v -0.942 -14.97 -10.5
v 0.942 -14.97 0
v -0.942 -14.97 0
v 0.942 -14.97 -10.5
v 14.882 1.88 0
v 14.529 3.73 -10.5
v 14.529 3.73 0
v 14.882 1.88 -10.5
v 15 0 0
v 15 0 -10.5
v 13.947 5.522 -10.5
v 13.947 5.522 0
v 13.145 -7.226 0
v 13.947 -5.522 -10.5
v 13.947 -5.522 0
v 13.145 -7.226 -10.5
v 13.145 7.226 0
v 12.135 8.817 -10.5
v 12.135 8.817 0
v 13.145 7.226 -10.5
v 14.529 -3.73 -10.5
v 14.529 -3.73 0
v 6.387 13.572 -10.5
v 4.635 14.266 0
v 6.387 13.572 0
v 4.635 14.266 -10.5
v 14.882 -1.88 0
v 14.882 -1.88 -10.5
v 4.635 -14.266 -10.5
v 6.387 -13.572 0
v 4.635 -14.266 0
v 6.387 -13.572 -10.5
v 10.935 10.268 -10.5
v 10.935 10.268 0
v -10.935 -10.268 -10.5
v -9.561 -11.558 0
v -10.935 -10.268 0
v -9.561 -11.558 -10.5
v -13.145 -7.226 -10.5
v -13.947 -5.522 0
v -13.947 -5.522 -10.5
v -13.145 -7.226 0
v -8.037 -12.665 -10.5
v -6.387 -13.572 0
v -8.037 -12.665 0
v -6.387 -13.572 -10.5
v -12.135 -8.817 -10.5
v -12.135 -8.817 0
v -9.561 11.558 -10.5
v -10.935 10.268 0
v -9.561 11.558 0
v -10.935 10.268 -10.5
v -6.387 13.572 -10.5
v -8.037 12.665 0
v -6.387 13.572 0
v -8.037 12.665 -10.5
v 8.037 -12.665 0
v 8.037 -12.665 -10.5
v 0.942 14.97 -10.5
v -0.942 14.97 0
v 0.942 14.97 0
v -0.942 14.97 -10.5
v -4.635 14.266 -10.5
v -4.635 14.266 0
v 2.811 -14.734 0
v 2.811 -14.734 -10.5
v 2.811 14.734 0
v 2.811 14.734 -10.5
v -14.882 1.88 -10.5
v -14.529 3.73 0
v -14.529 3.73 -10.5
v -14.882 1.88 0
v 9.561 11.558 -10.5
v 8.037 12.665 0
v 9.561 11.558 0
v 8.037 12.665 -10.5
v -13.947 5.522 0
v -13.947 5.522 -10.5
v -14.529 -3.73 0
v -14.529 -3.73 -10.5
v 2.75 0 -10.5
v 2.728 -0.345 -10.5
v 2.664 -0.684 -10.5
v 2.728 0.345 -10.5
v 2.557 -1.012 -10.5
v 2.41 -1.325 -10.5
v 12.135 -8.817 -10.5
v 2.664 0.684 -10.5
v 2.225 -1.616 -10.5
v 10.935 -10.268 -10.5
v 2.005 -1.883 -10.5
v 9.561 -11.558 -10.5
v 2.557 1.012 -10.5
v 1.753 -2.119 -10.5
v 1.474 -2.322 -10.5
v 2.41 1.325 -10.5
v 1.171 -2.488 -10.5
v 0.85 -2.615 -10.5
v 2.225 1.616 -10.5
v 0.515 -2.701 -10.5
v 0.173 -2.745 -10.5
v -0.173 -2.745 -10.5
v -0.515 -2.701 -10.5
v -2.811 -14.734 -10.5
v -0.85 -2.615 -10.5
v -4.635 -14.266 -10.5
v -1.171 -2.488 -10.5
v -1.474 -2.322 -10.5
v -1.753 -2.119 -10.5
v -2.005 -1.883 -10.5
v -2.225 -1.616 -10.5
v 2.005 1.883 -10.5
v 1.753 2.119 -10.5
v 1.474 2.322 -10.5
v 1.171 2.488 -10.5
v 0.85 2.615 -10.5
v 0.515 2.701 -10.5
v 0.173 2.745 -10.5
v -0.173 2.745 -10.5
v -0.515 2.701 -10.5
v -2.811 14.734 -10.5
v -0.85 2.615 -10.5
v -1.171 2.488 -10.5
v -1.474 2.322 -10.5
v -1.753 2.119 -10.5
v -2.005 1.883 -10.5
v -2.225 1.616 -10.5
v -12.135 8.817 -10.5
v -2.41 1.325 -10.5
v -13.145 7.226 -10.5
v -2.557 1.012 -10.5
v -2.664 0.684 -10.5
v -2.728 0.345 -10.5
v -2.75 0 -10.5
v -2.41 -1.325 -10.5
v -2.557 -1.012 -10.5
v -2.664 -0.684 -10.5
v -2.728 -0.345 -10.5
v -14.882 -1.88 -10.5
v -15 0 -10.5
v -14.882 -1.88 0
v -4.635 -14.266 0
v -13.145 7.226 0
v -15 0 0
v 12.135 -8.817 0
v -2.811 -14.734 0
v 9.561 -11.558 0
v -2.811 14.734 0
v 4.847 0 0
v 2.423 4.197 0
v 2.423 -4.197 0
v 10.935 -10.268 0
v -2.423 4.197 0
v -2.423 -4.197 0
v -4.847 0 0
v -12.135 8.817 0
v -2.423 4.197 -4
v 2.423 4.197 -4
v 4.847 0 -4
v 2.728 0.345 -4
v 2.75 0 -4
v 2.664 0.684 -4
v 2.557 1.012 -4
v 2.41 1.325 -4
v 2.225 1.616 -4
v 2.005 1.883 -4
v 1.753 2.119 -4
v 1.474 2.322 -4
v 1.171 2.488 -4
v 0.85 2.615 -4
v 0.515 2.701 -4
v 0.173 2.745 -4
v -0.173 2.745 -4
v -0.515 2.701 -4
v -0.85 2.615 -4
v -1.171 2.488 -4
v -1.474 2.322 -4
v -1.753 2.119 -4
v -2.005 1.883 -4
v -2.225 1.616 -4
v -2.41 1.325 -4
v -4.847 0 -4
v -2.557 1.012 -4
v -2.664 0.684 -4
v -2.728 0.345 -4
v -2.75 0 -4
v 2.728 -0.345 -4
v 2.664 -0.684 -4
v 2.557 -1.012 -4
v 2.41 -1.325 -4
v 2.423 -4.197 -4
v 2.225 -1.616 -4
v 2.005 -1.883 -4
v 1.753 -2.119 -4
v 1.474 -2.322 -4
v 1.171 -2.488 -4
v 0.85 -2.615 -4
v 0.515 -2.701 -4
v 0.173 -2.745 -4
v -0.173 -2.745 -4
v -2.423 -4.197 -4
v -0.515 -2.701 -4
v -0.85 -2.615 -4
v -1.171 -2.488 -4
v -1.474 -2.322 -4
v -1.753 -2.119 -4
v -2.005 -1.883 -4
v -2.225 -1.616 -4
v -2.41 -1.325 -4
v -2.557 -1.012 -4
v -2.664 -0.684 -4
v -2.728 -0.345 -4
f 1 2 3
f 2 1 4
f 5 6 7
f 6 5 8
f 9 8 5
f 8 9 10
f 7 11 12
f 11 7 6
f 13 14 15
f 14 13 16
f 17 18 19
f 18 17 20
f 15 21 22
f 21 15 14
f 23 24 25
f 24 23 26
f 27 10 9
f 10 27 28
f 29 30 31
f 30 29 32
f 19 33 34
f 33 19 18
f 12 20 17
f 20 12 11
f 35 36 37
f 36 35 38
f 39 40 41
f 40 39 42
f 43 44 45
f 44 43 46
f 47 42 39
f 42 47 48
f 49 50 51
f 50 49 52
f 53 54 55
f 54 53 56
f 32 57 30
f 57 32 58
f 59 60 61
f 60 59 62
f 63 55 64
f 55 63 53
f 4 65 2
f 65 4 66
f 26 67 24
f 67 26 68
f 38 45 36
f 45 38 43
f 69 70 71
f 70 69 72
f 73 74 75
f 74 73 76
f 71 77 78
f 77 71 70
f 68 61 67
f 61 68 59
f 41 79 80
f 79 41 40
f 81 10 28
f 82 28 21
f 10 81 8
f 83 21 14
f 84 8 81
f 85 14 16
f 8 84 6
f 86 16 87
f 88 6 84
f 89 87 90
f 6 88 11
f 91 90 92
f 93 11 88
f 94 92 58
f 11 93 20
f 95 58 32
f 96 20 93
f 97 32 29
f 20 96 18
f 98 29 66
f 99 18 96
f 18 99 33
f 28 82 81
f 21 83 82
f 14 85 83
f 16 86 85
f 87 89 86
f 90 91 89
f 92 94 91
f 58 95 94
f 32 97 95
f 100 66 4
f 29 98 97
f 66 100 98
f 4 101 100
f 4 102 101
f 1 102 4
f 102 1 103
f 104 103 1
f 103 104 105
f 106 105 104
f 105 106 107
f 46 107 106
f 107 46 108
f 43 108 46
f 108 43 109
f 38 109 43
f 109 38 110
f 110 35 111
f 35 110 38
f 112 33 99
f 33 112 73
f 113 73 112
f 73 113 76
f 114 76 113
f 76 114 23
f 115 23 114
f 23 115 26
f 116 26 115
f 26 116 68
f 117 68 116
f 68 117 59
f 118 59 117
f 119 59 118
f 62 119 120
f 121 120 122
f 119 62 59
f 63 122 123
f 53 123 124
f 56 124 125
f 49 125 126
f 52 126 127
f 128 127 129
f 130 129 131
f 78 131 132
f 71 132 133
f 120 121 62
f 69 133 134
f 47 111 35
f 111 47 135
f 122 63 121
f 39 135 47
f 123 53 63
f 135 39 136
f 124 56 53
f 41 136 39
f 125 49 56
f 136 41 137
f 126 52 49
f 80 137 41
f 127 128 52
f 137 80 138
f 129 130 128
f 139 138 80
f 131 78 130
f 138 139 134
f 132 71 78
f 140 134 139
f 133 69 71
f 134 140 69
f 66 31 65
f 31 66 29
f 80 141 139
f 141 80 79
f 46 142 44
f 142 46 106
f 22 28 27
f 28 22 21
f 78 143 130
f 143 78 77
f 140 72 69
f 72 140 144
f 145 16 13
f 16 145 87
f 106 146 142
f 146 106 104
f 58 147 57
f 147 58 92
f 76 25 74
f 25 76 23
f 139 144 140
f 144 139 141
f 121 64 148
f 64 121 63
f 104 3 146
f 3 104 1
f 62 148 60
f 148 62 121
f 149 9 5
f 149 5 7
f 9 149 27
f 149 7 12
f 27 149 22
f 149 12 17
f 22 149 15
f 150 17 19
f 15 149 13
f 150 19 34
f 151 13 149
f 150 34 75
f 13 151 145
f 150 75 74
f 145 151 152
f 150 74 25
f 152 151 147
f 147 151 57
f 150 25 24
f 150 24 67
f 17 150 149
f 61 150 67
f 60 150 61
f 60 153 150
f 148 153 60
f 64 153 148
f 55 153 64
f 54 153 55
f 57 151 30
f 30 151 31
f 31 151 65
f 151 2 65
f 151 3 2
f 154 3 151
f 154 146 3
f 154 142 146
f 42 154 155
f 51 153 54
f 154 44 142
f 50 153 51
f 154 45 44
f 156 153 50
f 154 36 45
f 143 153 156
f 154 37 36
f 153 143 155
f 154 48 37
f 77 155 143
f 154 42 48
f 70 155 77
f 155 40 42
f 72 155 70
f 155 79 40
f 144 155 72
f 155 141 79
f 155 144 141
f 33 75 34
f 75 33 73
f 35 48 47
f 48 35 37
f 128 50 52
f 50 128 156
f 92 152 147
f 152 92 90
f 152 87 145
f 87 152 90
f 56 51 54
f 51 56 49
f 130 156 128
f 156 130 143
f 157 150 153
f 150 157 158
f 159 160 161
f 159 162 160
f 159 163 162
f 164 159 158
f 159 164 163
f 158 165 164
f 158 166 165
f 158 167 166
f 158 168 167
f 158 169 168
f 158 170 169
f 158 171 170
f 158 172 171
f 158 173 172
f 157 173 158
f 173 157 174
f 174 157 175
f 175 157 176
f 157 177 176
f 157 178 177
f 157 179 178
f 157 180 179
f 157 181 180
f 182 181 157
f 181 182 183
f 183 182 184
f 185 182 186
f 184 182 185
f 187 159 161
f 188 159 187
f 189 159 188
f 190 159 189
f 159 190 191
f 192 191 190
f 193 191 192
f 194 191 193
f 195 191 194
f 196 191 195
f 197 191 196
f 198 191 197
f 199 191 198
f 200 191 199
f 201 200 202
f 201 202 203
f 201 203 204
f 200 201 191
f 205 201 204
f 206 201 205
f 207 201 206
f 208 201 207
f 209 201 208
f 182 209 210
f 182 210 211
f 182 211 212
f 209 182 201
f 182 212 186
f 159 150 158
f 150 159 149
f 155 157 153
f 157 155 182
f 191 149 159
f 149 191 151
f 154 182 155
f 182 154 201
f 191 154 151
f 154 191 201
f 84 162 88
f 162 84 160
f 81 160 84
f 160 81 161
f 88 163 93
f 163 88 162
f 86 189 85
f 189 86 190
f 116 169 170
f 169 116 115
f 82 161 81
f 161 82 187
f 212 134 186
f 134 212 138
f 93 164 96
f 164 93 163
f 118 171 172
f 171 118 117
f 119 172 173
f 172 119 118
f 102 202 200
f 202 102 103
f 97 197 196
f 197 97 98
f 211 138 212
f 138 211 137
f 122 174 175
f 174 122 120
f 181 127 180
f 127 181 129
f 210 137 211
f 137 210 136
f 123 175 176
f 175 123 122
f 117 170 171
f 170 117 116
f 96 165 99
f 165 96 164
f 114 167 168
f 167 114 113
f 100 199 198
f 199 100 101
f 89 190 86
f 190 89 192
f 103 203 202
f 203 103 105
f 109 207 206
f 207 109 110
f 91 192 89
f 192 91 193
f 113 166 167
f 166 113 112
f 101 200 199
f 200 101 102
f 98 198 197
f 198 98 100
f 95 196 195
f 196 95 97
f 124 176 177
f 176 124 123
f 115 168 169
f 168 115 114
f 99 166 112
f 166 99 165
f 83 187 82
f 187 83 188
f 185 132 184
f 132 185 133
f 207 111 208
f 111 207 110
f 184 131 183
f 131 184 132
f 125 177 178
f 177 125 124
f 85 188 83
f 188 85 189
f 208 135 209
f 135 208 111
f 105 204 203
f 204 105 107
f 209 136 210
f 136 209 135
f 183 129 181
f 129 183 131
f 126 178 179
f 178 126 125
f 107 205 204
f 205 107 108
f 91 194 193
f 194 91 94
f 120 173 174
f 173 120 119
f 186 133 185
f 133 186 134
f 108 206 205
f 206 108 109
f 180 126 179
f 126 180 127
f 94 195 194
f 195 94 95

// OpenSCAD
$fn = 50;


difference() {
	union() {
		translate(v = [0, 0, -10.5000000000]) {
			cylinder(h = 10.5000000000, r = 15.0000000000);
		}
		translate(v = [0, 0, -9.0000000000]) {
			cylinder(h = 9, r = 2.8750000000);
		}
	}
	union() {
		translate(v = [0, 0, 0]) {
			rotate(a = [0, 0, 0]) {
				difference() {
					union() {
						translate(v = [0, 0, -4]) {
							linear_extrude(height = 4) {
								polygon(points = [[4.8468000000, 0.0000000000], [2.4234000000, 4.1974519271], [-2.4234000000, 4.1974519271], [-4.8468000000, 0.0000000000], [-2.4234000000, -4.1974519271], [2.4234000000, -4.1974519271]]);
							}
						}
					}
					union();
				}
			}
		}
		#translate(v = [0, 0, -100.0000000000]) {
			cylinder(h = 200, r = 2.7500000000);
		}
	}
}
